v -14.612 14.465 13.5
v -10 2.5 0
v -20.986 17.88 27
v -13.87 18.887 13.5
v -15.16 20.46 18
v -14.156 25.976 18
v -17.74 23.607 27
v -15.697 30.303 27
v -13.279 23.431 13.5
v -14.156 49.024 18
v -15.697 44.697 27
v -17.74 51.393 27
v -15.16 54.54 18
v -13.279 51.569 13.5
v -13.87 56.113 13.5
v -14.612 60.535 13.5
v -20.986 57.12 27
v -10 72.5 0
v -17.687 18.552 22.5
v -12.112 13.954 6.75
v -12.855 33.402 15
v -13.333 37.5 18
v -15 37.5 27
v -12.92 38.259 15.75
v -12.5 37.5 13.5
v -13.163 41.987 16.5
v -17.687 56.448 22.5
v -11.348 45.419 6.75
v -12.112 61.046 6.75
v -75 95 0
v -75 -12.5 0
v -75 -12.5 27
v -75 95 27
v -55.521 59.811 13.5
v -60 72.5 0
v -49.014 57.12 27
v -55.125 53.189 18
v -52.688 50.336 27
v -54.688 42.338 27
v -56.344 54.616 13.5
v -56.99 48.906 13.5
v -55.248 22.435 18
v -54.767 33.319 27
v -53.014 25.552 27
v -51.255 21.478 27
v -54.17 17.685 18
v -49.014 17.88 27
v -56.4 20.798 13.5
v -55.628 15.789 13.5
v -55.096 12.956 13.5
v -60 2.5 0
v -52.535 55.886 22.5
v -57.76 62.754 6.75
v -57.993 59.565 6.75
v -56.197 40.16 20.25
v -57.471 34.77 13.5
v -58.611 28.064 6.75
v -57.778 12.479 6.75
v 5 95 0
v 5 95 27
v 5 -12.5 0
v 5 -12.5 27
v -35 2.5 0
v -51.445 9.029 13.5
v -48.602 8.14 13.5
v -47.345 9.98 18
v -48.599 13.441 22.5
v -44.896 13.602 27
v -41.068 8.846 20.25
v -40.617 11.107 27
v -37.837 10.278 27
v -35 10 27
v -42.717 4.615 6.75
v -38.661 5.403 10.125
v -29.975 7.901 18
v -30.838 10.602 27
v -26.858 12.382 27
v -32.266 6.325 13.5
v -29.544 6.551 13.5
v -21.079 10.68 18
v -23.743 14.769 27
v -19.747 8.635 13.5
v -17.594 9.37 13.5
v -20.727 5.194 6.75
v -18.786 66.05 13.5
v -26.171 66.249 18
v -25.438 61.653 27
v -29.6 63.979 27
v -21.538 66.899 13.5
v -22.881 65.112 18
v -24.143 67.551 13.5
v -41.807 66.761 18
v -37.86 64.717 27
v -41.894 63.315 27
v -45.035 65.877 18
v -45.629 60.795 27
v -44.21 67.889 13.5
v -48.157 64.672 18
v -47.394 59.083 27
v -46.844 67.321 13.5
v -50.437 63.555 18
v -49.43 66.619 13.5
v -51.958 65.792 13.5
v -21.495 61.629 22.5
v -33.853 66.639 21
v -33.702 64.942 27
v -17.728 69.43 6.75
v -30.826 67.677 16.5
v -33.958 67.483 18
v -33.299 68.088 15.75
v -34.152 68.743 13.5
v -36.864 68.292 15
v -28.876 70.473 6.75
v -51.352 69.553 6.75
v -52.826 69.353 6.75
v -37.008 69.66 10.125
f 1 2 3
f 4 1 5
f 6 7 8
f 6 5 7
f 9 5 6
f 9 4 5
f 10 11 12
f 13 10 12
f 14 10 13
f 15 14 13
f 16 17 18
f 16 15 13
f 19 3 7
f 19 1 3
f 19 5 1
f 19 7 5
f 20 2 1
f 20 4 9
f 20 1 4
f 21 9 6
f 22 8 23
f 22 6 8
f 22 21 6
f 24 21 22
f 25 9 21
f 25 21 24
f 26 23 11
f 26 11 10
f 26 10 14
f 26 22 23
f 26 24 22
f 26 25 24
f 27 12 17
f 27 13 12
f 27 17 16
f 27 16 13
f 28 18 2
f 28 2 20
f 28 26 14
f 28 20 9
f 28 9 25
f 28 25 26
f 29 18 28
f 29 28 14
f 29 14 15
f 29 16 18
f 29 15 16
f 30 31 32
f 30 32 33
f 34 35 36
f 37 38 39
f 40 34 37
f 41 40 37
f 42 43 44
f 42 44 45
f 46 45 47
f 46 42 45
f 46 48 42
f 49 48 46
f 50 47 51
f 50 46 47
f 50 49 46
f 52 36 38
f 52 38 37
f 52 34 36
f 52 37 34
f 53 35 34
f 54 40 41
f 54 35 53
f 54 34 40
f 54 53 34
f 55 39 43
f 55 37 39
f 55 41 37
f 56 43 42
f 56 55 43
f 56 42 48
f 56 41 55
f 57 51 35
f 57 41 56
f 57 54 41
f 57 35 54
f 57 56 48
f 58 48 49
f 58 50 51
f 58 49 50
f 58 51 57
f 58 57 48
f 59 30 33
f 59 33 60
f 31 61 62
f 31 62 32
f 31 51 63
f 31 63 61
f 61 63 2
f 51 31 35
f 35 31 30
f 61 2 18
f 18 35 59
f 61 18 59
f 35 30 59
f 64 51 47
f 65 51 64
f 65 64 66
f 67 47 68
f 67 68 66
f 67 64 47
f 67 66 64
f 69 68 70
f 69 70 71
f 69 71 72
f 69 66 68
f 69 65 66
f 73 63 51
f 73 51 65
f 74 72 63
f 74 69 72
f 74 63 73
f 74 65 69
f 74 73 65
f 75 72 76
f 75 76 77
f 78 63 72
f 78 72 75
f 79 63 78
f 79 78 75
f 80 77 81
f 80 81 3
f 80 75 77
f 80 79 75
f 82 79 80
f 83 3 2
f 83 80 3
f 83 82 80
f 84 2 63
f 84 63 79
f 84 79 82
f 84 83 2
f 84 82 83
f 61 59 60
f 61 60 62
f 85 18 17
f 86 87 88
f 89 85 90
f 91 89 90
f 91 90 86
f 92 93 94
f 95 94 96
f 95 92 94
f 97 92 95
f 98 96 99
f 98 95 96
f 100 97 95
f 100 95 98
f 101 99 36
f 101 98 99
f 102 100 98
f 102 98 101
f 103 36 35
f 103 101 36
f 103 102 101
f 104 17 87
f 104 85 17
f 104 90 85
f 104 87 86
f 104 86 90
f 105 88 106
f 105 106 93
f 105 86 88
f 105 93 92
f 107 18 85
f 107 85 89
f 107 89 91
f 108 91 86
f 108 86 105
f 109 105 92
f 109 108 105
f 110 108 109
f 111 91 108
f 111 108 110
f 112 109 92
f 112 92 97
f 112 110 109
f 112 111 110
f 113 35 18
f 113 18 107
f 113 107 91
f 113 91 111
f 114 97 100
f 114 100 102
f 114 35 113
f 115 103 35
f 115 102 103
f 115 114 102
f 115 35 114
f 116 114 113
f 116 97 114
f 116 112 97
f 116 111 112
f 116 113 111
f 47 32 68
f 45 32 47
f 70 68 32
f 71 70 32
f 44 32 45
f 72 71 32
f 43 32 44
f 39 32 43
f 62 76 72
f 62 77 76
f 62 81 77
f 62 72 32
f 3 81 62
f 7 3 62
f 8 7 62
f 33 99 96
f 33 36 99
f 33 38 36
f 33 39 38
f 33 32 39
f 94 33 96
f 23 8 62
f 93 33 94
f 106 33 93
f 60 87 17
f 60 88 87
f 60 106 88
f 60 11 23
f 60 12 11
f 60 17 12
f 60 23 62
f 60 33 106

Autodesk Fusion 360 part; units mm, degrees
sketch "Sketch1" plane through (0, 0, 0) normal (0, 0, 1) x (1, 0, 0)
  line L0 (0, 0) -> (-70, 0)
  line L1 (-70, 0) -> (-70, 90)
  line L2 (-70, 90) -> (0, 90)
  line L3 (0, 90) -> (0, 0)
  line L4 (-70, 0) -> (0, 0)
  line L5 (0, 0) -> (0, 10)
  line L6 (0, 10) -> (-70, 10)
  line L7 (-70, 10) -> (-70, 0)
  line L8 (-70, 10) -> (-35, 10)
  line L9 (0, 10) -> (0, 32.5)
  line L10 (-35, 10) -> (-15, 10)
  line L11 (-15, 10) -> (-15, 37.5)
  line L12 (-15, 10) -> (-35, 10)
  line L13 (-35, 10) -> (-35, 37.5)
  line L14 (-35, 37.5) -> (-15, 37.5)
  line L15 (-15, 37.5) -> (-15, 10)
  ellipse E0 centre (-35, 37.5) end of major axis (-35, 10) minor radius 20
  line L16 (-35, 65) -> (-35, 10) construction
  line L17 (-55, 37.5) -> (-15, 37.5) construction
  line L18 (0, 10) -> (-10, 10)
  line L19 (-10, 10) -> (-60, 10)
  line L20 (-60, 10) -> (-60, 72.5)
  line L21 (-60, 72.5) -> (-10, 72.5)
  line L22 (-10, 72.5) -> (-10, 10)
  line L23 (0, 10) -> (-70, 10)
  line L24 (-70, 10) -> (-70, 2.5)
  line L25 (-70, 2.5) -> (0, 2.5)
  line L26 (0, 2.5) -> (0, 10)
  line L27 (0, 2.5) -> (-70, 2.5)
  line L28 (-70, 2.5) -> (-70, -7.5)
  line L29 (-70, -7.5) -> (0, -7.5)
  line L30 (0, -7.5) -> (0, 2.5)
  line L31 (-10, 10) -> (-60, 10)
  line L32 (-60, 10) -> (-60, 2.5)
  line L33 (-60, 2.5) -> (-10, 2.5)
  line L34 (-10, 2.5) -> (-10, 10)
  line L35 (0, -7.5) -> (5, -7.5)
  line L36 (5, -7.5) -> (5, -12.5)
  line L37 (5, -12.5) -> (0, -12.5)
  line L38 (0, -12.5) -> (0, -7.5)
  line L39 (5, -12.5) -> (-75, -12.5)
  line L40 (-75, -12.5) -> (-75, 95)
  line L41 (-75, 95) -> (5, 95)
  line L42 (5, 95) -> (5, -12.5)
  dimension "d1" = 70
  dimension "d2" = 90
  dimension "d3" = 10
  dimension "d4" = 35
  dimension "d5" = 22.5
  dimension "d6" = 20
  dimension "d7" = 27.5
  dimension "d8" = 27.5
  dimension "d11" = 10
  dimension "d12" = 50
  dimension "d13" = 62.5
  dimension "d14" = 70
  dimension "d15" = 7.5
  dimension "d16" = 70
  dimension "d17" = 10
  dimension "d20" = 50
  dimension "d21" = 7.5
  dimension "d22" = 5
  dimension "d23" = 5
  dimension "d24" = 80
  dimension "d25" = 107.5
extrude "Extrude1" add sketch "Sketch1" along normal blind 27 contours L0 L1 L3 L4 L5 L7 L25 L27 L28 L30 L33 | L3 L5 L6 L18 L23 L25 L26 L27 L34 | L1 L6 L7 L8 L23 L24 L25 L27 L32 | L1 L2 L3 L6 L8 L9 L18 L20 L21 L22 L23 | L6 L8 L10 L12 L19 L23 L25 L27 L31 L32 L33 L34 | L6 L8 L11 L15 E0 L19 L20 L21 L22 L23 L31 | L6 L10 L11 L12 L15 E0 L19 L23 L31
extrude "Extrude2" add sketch "Sketch1" along normal blind 27 contours L0 L4 L28 L29 L30
sketch "Sketch2" plane through (0, 0, 27) normal (0, 0, 1) x (-1, 0, 0)
  ellipse E0 centre (35, -37.5) end of major axis (35, -10) minor radius 20
  line L0 (70, -90) -> (70, 7.5)
  line L1 (70, 7.5) -> (0, 7.5)
  line L2 (0, 7.5) -> (0, -90)
  line L3 (0, -90) -> (70, -90)
  ellipse E1 centre (35, -37.5) end of major axis (35, -10) minor radius 20
  line L4 (35, -65) -> (35, -10) construction
  line L5 (55, -37.5) -> (15, -37.5) construction
loft "Loft1" cut profiles "Sketch2", "Sketch1" section 1 contours E0 E1 section 2 contours L6 L8 L10 L12 L19 L23 L25 L27 L31 L32 L33 L34 | L6 L8 L11 L15 E0 L19 L20 L21 L22 L23 L31 | L6 L10 L11 L12 L15 E0 L19 L23 L31
extrude "Extrude3" add sketch "Sketch1" along normal blind 27
sketch "Sketch3" plane through (0, 0, 0) normal (0, 0, -1) x (1, 0, 0)
  line L0 (-75, -95) -> (5, -95)
  line L1 (5, -95) -> (5, 12.5)
  line L2 (5, 12.5) -> (-75, 12.5)
  line L3 (-75, 12.5) -> (-75, -95)
  line L4 (-60, -72.5) -> (-60, -2.5)
  line L5 (-60, -2.5) -> (-10, -2.5)
  line L6 (-10, -2.5) -> (-10, -72.5)
  line L7 (-10, -72.5) -> (-60, -72.5)
